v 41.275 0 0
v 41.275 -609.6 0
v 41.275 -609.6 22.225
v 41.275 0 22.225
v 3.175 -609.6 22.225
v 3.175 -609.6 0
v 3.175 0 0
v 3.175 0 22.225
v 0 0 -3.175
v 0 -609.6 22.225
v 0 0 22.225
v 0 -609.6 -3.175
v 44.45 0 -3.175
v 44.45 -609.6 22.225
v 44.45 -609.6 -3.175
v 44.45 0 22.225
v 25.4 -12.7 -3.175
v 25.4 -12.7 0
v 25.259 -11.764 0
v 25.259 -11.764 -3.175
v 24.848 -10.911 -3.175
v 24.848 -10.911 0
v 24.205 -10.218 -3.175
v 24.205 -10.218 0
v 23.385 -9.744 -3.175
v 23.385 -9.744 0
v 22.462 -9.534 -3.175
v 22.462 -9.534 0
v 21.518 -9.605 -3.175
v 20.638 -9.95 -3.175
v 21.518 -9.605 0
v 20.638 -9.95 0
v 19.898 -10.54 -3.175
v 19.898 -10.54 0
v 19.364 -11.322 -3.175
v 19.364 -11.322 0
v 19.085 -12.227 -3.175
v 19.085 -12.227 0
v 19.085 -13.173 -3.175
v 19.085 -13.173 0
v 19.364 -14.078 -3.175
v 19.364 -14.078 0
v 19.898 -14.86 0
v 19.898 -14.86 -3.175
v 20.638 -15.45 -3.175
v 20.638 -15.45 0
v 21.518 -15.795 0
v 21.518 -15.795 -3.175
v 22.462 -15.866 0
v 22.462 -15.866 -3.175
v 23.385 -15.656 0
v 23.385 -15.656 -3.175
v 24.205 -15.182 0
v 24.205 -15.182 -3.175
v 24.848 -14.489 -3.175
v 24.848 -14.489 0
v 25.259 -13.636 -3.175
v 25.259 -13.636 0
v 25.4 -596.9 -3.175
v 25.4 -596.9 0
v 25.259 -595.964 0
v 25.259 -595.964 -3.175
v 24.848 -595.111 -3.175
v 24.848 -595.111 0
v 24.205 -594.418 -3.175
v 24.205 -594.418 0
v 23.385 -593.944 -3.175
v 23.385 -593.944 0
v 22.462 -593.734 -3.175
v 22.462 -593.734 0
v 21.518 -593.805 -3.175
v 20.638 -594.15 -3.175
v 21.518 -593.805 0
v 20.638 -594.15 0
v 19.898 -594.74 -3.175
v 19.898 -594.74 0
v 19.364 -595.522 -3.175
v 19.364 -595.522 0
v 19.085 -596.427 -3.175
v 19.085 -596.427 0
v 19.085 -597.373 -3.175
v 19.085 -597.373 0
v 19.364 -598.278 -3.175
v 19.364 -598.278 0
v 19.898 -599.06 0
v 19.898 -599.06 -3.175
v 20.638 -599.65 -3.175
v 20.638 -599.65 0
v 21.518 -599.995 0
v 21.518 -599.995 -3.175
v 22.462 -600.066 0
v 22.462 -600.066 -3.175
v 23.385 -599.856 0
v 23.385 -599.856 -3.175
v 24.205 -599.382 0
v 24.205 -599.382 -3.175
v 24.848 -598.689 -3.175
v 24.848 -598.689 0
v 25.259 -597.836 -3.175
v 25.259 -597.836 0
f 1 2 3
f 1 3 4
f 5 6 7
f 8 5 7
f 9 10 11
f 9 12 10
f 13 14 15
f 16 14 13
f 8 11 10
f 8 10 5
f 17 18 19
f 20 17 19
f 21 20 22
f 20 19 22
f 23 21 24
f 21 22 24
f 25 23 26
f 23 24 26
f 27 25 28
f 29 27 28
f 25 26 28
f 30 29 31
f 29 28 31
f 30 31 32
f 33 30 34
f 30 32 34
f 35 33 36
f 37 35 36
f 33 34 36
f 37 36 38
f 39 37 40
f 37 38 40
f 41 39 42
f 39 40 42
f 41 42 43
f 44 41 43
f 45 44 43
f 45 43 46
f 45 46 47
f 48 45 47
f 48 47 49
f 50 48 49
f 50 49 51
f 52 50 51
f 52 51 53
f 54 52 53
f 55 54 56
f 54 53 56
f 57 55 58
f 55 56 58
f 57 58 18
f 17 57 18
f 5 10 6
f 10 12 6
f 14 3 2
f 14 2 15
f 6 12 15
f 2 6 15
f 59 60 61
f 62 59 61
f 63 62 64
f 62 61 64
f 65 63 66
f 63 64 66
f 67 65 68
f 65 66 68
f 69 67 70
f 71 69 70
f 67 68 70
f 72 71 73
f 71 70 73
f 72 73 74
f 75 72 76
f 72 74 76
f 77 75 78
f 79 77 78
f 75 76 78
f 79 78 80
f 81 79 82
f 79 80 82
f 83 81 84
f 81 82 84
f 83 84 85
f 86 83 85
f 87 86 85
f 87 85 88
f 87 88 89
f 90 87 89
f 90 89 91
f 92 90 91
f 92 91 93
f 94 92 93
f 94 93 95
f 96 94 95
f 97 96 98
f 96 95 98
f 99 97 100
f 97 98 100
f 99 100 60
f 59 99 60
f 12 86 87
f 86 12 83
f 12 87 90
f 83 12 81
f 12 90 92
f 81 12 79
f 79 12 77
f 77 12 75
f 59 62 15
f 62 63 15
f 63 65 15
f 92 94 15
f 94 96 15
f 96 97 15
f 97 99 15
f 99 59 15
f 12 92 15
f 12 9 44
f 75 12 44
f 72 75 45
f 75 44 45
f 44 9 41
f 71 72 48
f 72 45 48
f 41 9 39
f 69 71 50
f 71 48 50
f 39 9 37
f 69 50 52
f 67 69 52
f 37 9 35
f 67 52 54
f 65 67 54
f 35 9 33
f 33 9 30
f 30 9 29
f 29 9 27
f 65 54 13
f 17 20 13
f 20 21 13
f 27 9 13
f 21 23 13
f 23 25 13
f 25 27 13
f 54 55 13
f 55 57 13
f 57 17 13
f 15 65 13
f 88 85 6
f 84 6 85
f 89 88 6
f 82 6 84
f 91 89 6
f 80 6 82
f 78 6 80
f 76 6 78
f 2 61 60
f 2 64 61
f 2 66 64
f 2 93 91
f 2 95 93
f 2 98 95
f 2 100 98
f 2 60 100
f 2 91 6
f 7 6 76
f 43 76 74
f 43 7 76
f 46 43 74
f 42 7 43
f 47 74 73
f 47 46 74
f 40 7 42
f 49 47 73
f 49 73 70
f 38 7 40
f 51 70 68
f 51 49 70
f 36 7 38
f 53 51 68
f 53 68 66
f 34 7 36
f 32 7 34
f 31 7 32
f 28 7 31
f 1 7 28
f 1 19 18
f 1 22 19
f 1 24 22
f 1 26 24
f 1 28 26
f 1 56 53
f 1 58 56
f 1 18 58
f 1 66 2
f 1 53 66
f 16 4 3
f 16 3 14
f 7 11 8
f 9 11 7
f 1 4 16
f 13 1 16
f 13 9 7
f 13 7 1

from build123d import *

# Parameters (mm, degrees)
F0_W     = 3.175
F0_H     = 609.6
F0_W_2   = 38.1
F0_R     = 3.175
F1_DEPTH = 3.175
F2_DEPTH = 22.225


with BuildPart() as f1:
    # F0 (on Top) → F1 (new body)
    with BuildSketch(Plane.XY):
        with Locations((1.5875, -304.8)):
            Rectangle(F0_W, F0_H)
        with Locations((22.225, -304.8)):
            Rectangle(F0_W_2, F0_H)
        with Locations((22.225, -596.9)):
            Circle(F0_R, mode=Mode.SUBTRACT)
        with Locations((22.225, -12.7)):
            Circle(F0_R, mode=Mode.SUBTRACT)
        with Locations((42.8625, -304.8)):
            Rectangle(F0_W, F0_H)
    extrude(amount=-F1_DEPTH)

    # F0 (on Top) → F2 (join)
    with BuildSketch(Plane.XY):
        with Locations((1.5875, -304.8)):
            Rectangle(F0_W, F0_H)
        with Locations((42.8625, -304.8)):
            Rectangle(F0_W, F0_H)
    extrude(amount=F2_DEPTH)


solid = f1.part
